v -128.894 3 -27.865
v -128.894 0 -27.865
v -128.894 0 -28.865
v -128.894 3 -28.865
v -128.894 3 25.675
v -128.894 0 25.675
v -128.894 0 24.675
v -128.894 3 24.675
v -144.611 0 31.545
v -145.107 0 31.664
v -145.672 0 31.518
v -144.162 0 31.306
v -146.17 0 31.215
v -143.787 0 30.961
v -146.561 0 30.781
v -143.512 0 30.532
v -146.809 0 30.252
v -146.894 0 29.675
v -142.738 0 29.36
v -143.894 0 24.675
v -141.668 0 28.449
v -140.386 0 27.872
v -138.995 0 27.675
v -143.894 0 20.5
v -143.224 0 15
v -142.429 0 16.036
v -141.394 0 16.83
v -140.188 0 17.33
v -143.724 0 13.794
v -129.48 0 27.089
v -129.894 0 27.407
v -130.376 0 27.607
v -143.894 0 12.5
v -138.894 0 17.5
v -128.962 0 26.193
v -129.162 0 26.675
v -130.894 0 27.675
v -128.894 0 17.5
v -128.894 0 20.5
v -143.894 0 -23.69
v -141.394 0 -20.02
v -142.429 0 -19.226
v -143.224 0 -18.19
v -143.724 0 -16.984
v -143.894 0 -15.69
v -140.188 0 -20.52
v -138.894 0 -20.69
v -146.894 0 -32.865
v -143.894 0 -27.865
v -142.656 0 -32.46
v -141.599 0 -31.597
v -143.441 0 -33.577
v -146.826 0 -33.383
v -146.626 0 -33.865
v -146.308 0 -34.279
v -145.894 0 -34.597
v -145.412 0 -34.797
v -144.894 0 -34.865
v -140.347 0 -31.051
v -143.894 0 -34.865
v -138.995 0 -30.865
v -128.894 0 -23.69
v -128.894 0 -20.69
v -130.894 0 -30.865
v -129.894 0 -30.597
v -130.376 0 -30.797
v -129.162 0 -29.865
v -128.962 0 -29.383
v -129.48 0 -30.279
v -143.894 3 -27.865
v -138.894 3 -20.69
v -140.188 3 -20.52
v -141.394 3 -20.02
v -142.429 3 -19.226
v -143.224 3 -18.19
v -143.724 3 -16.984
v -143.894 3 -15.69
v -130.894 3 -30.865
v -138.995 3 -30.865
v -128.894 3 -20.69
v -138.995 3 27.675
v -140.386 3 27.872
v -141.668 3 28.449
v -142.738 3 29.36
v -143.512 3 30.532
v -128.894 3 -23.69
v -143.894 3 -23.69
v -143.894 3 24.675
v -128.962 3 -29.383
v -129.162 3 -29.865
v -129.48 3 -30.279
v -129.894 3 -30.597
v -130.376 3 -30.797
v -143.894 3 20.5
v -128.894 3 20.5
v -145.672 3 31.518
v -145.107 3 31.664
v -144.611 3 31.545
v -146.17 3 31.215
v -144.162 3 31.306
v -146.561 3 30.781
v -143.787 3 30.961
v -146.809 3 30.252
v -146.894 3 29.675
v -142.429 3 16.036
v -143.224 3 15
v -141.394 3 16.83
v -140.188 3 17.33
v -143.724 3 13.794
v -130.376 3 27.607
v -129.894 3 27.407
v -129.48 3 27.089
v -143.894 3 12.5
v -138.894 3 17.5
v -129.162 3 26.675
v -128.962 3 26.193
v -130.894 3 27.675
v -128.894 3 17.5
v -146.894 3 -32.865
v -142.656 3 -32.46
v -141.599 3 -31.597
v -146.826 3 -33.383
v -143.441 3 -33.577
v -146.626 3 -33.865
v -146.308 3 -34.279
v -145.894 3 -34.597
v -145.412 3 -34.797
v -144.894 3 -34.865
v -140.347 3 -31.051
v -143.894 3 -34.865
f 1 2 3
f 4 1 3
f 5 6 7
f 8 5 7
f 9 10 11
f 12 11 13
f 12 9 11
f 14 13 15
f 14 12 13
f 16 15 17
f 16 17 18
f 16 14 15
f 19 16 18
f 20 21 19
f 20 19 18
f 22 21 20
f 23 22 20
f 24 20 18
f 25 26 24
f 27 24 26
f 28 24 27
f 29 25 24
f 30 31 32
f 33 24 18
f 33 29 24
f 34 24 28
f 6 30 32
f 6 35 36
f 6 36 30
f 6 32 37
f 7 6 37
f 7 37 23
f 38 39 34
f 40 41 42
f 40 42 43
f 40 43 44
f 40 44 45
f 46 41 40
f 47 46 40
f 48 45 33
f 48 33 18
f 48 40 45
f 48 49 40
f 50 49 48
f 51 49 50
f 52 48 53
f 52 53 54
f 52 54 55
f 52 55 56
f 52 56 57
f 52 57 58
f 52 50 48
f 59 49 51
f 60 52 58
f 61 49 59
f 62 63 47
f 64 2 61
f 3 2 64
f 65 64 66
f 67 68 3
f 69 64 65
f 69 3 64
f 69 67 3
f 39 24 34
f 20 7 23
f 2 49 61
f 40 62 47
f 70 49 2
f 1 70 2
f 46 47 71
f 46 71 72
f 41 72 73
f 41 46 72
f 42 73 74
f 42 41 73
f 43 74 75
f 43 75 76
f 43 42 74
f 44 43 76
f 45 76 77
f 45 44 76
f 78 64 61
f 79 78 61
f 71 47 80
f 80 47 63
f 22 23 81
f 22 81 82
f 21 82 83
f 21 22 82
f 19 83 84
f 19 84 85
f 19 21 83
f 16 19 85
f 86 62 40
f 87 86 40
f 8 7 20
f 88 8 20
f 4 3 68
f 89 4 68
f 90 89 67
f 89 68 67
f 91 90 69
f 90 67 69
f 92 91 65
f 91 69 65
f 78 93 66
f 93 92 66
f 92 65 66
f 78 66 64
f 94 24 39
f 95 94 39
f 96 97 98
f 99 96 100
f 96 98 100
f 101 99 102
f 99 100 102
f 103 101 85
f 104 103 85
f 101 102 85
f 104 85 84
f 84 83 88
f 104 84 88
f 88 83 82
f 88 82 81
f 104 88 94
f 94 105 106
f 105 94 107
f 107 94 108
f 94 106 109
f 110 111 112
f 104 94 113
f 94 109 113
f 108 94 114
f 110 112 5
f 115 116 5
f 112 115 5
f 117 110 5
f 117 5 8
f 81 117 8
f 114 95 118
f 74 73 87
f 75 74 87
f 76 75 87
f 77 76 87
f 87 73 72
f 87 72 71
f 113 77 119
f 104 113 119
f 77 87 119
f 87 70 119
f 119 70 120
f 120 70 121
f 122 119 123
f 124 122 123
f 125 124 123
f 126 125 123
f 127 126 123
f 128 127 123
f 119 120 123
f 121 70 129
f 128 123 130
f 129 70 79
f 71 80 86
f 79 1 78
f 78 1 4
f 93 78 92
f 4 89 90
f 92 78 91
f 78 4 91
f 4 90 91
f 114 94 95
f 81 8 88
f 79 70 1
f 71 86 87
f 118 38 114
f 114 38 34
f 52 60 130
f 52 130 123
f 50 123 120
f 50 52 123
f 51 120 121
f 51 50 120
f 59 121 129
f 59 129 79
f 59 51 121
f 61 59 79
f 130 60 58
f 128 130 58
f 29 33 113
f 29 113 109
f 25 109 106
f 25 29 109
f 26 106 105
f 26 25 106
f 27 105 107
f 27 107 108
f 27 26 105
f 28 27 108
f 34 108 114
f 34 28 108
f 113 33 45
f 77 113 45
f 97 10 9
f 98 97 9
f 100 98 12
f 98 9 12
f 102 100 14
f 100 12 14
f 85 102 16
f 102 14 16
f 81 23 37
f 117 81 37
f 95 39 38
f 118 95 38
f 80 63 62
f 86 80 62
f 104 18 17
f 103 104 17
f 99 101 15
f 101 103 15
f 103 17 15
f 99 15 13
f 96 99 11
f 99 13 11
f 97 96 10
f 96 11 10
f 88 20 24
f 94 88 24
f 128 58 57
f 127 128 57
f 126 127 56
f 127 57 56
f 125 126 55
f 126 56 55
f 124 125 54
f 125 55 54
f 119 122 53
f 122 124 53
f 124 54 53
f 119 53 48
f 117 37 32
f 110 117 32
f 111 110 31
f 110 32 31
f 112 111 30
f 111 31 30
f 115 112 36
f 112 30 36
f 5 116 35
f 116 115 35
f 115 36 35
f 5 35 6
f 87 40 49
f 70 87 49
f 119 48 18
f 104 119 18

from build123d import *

# Parameters (mm, degrees)
BOSS_EXTRUDE1_DEPTH = 3
FILLET1_R           = 5
FILLET2_R           = 2


with BuildPart() as part:
    # Sketch2 → Boss-Extrude1 (new body)
    with BuildSketch(Plane(origin=(0, 0, 0), x_dir=(1, 0, 0), z_dir=(0, 1, 0))):
        Polygon((-128.893875, -24.675), (-143.893875, -24.675), (-143.893875, -20.5), (-128.893875, -20.5), (-128.893875, -17.5), (-143.893875, -17.5), (-143.893875, 20.69), (-128.893875, 20.69), (-128.893875, 23.69), (-143.893875, 23.69), (-143.893875, 27.865), (-128.893875, 27.865), (-128.893875, 30.865), (-143.893875, 30.865), (-143.893875, 34.865), (-146.893875, 34.865), (-146.893875, -31.675), (-143.893875, -31.675), (-143.893875, -27.675), (-128.893875, -27.675), align=None)
    extrude(amount=BOSS_EXTRUDE1_DEPTH)

    # Fillet1
    # the kernel refuses this fillet: 5 mm, written as the material it adds along each edge
    with BuildSketch(Plane(origin=(-143.893875, 0, 27.675), x_dir=(1.4566126083077746e-12, 0, 1.0), z_dir=(0, 1, 0))) as fillet1_piece_1:
        with BuildLine():
            CenterArc((5, 4.898979486), FILLET1_R, 180, 78.463040967)
            Line((0, 4.898979486), (-0.1, 4.898979486))
            Line((-0.1, 4.898979486), (-0.1, 0))
            Line((-0.1, 0), (0, -0.1))
            ThreePointArc((0, -0.1), (2, -0.1), (3.98, -0.09797959))
            Line((3.98, -0.09797959), (4, 0))
        make_face()
    extrude(amount=3)
    with BuildSketch(Plane(origin=(-143.893875, 0, -30.865), x_dir=(1, 0, 0), z_dir=(0, 1, 0))) as fillet1_piece_2:
        with BuildLine():
            CenterArc((4.898979486, 5), FILLET1_R, 191.536959033, 78.463040967)
            Line((0, 4), (-0.09797959, 3.98))
            ThreePointArc((-0.09797959, 3.98), (-0.1, 2), (-0.1, 0))
            Line((-0.1, 0), (0, -0.1))
            Line((0, -0.1), (4.898979486, -0.1))
            Line((4.898979486, -0.1), (4.898979486, 0))
        make_face()
    extrude(amount=3)
    with BuildSketch(Plane(origin=(-143.893875, 0, -20.69), x_dir=(0, 0, 1), z_dir=(0, 1, 0)), Plane(origin=(-143.893875, 0, 17.5), x_dir=(1, 0, 0), z_dir=(0, 1, 0))) as fillet1_piece_3:
        with BuildLine():
            CenterArc((FILLET1_R, FILLET1_R), FILLET1_R, 180, 90)
            Line((0, FILLET1_R), (-FILLET1_R * 0.02, FILLET1_R))
            Line((-FILLET1_R * 0.02, FILLET1_R), (-FILLET1_R * 0.02, -FILLET1_R * 0.02))
            Line((-FILLET1_R * 0.02, -FILLET1_R * 0.02), (FILLET1_R, -FILLET1_R * 0.02))
            Line((FILLET1_R, -FILLET1_R * 0.02), (FILLET1_R, 0))
        make_face()
    extrude(amount=3)

    # Fillet2
    # the kernel refuses this fillet: 2 mm, written as the material it takes off along each edge
    with BuildSketch(Plane(origin=(-128.893875, -5, 27.675), x_dir=(-1, 0, 0), z_dir=(0, 1, 0)), Plane(origin=(-128.893875, -5, -30.865), x_dir=(0, 0, 1), z_dir=(0, 1, 0)), Plane(origin=(-146.893875, -5, -34.865), x_dir=(1, 0, 0), z_dir=(0, 1, 0)), Plane(origin=(-146.893875, -5, 31.675), x_dir=(0, 0, -1), z_dir=(0, 1, 0))) as fillet2_piece_1:
        with BuildLine():
            CenterArc((FILLET2_R, -FILLET2_R), FILLET2_R, 90, 90)
            Line((0, -FILLET2_R), (0, 0))
            Line((0, 0), (FILLET2_R, 0))
        make_face()
    extrude(amount=13, mode=Mode.SUBTRACT)
    with BuildSketch(Plane(origin=(-143.893875, -3.563939587, 31.675), x_dir=(-1, 0, 0), z_dir=(0, 1, 0))) as fillet2_piece_2:
        with BuildLine():
            CenterArc((1.425575835, -2), FILLET2_R, 90, 64.623066475)
            ThreePointArc((-0.381439971, -1.142857143), (-0.156170388, -0.582959844), (0, 0))
            Line((0, 0), (1.425575835, 0))
        make_face()
    extrude(amount=10.127879174, mode=Mode.SUBTRACT)


solid = part.part
